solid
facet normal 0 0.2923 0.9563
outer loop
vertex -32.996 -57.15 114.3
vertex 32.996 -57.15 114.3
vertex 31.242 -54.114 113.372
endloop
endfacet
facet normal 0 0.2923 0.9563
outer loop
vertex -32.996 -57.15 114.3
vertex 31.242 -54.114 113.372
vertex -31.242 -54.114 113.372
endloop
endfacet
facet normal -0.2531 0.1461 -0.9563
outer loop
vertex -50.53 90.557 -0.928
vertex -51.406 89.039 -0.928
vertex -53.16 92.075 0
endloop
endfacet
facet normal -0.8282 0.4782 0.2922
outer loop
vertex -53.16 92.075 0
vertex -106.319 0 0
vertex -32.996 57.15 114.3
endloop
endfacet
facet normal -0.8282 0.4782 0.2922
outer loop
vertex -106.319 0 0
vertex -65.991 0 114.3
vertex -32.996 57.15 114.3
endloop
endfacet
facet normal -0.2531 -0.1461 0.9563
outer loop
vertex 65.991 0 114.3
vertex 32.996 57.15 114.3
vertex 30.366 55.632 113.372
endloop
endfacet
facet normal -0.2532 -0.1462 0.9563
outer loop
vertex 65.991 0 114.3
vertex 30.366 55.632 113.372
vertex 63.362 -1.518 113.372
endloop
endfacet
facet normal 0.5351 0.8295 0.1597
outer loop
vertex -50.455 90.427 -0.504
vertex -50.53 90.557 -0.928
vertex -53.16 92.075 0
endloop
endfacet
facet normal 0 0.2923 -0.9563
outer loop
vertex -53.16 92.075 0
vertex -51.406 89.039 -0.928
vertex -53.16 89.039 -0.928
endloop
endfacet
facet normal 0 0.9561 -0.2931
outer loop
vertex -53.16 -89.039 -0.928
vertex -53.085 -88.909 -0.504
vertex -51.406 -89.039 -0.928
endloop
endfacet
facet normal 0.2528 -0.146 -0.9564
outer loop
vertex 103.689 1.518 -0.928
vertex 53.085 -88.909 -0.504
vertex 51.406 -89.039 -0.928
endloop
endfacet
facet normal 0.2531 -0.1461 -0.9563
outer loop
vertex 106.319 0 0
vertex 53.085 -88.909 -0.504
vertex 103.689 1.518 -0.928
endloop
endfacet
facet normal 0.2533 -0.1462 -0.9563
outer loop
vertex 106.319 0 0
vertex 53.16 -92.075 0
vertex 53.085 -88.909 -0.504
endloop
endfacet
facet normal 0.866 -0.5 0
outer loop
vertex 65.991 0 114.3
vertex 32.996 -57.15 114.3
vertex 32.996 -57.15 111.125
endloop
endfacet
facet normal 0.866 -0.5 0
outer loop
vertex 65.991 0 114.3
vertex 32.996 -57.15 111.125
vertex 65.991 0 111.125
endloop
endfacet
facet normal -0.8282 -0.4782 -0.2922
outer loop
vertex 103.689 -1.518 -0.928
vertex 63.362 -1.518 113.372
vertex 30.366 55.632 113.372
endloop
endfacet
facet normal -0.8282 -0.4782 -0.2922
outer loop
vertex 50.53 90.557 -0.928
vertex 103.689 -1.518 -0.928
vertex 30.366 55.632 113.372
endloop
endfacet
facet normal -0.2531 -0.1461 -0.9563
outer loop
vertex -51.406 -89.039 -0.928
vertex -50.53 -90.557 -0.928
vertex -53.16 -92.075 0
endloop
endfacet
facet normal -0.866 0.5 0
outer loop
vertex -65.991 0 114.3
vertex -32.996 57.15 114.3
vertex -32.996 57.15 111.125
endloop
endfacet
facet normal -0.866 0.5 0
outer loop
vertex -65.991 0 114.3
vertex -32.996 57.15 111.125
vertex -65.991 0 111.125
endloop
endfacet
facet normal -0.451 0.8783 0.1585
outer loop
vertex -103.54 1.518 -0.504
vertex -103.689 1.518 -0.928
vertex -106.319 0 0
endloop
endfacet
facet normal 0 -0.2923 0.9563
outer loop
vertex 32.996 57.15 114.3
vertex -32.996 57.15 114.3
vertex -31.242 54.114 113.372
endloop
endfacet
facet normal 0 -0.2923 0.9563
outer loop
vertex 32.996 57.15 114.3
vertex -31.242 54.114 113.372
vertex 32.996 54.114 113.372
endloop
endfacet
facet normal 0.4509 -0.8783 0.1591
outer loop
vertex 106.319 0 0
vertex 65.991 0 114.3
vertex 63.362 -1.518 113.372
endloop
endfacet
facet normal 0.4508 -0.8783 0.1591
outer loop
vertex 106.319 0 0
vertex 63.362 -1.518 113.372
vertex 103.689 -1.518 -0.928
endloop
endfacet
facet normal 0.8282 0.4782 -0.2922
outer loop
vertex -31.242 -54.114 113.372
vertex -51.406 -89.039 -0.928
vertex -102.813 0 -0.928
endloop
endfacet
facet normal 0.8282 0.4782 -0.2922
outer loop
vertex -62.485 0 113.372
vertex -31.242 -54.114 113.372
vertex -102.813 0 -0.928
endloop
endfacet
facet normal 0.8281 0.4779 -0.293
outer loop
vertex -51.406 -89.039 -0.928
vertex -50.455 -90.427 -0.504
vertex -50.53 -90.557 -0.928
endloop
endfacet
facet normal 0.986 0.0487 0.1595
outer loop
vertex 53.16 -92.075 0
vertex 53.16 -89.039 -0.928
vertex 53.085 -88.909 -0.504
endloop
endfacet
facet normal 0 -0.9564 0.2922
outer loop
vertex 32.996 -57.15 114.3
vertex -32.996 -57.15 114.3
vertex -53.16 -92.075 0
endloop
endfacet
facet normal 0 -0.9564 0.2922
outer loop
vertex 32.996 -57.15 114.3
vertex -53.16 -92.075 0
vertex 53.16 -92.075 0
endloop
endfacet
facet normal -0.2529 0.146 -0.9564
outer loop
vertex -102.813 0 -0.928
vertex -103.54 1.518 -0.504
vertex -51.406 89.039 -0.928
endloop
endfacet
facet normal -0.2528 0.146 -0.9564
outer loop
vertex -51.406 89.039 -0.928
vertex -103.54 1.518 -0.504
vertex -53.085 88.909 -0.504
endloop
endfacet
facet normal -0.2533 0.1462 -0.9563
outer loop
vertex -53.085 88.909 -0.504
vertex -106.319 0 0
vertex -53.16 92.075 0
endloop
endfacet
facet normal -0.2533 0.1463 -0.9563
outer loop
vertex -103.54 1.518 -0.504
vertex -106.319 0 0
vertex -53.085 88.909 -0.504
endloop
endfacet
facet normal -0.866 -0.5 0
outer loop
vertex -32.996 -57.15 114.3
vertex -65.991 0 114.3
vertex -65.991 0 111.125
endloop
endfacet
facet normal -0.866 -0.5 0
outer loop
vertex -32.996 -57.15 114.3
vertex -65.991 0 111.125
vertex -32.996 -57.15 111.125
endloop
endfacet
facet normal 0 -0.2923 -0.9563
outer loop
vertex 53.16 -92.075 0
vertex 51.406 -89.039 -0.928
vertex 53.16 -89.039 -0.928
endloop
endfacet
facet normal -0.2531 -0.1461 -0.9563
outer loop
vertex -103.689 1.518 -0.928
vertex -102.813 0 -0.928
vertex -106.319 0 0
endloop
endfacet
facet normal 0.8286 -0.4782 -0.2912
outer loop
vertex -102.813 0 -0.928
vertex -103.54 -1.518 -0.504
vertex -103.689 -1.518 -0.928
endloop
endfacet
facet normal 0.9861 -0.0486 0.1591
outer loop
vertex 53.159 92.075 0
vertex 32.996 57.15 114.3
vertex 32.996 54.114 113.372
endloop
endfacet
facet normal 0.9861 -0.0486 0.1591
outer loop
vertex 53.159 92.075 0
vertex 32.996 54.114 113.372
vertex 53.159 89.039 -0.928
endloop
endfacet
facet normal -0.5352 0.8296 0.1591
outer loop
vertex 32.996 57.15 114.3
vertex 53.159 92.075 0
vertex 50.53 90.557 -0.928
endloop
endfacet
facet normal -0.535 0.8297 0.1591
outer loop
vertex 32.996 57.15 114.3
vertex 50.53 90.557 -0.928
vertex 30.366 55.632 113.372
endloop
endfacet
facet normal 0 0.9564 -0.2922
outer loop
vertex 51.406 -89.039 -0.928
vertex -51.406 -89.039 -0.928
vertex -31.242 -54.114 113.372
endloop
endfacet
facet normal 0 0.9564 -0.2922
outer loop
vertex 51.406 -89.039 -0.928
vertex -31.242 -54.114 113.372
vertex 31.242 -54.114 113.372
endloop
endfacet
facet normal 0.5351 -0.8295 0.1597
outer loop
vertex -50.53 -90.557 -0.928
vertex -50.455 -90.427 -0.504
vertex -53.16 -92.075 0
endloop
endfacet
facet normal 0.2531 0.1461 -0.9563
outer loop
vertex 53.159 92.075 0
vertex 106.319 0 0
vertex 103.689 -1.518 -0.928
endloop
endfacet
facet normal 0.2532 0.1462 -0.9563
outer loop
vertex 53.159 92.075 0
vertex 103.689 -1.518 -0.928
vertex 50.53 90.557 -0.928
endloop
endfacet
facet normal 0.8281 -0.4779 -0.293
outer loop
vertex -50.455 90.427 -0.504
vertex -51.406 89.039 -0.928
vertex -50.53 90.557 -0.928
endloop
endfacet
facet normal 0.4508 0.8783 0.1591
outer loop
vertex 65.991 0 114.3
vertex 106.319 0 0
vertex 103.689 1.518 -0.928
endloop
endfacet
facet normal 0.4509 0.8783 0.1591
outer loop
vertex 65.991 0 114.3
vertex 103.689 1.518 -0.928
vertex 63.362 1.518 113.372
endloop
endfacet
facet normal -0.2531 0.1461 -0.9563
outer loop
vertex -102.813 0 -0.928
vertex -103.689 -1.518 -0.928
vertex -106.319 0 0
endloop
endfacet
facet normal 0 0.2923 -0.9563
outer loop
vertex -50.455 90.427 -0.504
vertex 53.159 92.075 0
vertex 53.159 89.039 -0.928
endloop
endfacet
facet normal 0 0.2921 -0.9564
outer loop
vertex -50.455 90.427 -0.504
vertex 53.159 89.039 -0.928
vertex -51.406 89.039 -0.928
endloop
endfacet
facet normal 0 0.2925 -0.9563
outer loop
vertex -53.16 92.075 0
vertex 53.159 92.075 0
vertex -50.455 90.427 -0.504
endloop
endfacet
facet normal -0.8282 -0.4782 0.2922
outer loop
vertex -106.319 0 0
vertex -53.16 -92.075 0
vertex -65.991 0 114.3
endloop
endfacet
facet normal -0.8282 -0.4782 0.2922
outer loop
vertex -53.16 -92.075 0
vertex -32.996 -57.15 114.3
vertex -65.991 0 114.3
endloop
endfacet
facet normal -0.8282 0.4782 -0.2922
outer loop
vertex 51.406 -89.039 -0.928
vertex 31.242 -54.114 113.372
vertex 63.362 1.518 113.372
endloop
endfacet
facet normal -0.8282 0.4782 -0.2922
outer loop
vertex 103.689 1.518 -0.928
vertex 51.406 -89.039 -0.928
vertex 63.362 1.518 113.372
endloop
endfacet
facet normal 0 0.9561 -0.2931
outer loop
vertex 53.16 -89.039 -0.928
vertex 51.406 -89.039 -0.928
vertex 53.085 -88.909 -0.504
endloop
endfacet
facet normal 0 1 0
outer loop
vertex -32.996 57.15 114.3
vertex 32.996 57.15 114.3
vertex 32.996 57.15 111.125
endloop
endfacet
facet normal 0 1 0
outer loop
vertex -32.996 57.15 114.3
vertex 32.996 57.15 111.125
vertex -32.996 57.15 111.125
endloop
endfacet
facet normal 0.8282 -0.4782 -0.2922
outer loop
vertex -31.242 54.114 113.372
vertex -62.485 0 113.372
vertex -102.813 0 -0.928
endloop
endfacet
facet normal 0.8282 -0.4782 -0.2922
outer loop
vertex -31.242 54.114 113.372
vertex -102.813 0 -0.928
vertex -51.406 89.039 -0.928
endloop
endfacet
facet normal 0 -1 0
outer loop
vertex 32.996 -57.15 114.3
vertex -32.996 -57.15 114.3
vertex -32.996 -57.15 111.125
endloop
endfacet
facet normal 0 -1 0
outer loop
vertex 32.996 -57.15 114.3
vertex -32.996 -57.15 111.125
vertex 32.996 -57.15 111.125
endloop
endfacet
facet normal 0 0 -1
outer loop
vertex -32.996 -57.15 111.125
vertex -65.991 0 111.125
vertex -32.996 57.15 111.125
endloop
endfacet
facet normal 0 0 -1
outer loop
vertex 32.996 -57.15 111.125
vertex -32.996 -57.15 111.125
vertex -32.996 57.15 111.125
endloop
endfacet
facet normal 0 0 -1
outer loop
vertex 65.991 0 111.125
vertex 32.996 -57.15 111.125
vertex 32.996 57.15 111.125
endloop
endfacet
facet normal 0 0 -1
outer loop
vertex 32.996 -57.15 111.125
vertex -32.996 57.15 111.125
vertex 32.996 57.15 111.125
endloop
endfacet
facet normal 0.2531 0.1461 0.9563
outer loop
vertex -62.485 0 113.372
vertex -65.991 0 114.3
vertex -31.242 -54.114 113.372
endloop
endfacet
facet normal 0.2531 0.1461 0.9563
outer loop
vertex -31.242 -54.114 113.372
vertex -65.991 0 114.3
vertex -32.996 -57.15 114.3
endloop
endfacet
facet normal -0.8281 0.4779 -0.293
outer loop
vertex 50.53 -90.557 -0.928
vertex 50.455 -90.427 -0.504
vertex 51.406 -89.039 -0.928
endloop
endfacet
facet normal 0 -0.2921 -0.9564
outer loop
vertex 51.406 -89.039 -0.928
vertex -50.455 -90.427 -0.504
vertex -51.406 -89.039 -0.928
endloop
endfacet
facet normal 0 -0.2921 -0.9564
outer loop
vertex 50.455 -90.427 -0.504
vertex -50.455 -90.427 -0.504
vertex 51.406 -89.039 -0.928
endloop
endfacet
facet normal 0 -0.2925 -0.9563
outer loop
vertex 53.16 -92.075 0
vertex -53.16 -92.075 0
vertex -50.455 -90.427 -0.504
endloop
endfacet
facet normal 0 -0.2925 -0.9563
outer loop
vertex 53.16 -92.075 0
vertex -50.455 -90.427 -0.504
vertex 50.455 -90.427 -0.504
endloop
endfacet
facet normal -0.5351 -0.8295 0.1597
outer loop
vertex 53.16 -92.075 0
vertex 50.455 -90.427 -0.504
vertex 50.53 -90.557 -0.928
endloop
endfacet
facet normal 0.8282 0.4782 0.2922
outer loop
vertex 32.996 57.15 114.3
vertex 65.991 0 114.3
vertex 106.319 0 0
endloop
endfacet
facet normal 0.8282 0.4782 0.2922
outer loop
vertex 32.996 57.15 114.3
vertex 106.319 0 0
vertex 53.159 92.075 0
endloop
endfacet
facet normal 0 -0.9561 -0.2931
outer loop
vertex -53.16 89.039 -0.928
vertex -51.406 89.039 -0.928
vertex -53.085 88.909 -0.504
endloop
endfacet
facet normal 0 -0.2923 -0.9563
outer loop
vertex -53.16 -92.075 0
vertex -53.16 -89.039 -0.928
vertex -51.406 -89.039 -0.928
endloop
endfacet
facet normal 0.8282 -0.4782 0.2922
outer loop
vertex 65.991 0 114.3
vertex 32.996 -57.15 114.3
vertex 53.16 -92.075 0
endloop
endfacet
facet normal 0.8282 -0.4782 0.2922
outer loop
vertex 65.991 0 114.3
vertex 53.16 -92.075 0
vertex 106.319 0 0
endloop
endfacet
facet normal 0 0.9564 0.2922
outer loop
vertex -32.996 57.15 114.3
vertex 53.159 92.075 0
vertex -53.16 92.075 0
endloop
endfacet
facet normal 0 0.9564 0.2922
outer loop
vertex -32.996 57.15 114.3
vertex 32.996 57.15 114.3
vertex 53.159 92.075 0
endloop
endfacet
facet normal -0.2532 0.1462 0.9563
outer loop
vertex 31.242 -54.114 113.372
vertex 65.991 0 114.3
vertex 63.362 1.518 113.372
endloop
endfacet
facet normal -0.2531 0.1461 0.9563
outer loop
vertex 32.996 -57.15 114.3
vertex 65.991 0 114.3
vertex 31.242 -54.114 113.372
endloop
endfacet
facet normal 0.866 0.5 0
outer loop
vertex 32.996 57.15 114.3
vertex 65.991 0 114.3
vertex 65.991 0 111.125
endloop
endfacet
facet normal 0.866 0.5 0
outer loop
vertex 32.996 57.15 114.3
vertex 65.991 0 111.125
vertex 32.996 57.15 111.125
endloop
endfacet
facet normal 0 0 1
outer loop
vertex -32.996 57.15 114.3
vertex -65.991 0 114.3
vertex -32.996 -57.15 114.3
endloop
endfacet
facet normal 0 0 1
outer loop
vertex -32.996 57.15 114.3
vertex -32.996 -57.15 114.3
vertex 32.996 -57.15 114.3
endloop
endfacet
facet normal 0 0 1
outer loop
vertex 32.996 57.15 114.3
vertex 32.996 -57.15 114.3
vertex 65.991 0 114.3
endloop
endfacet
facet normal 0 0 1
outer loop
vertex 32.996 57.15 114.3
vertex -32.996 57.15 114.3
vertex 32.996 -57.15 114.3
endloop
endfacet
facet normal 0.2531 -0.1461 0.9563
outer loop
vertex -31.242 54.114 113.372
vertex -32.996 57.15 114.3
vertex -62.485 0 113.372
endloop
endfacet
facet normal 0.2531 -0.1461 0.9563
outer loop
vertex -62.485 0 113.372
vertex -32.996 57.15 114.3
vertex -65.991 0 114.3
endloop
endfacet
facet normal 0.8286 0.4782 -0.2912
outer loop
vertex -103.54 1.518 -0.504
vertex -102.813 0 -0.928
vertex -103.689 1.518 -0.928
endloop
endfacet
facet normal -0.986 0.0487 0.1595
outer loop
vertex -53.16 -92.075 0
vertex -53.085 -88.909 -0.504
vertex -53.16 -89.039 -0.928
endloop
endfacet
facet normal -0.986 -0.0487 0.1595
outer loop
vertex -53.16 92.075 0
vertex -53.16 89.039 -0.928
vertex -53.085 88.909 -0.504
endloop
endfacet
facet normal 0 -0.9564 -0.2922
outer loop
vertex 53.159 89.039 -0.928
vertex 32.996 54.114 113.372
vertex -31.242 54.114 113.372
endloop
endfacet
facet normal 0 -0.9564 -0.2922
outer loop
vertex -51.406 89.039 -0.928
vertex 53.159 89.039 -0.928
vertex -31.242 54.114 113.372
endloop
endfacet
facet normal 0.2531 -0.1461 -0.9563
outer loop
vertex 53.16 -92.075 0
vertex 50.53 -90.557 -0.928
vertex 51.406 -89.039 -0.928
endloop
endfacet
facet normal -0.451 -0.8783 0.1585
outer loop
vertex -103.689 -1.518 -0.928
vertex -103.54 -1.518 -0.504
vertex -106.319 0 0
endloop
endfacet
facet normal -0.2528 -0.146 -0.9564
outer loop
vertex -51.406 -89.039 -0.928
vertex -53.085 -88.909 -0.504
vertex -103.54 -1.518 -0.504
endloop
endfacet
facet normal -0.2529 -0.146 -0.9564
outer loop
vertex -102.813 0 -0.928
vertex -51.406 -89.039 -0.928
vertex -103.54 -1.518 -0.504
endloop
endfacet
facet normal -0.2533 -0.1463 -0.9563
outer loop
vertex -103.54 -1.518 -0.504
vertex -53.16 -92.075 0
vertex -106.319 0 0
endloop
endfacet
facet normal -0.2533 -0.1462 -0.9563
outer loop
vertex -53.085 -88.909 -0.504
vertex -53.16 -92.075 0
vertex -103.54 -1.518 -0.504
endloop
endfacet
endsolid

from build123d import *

# Parameters (mm, degrees)
F15_DEPTH = 3.175
F16_DEPTH = 3.175
F17_DEPTH = 3.175
F18_DEPTH = 3.175
F19_DEPTH = 3.175
F20_DEPTH = 3.175
F21_DEPTH = 3.175
F22_W     = 51
F22_H     = 51
F23_DEPTH = 3


with BuildPart() as f15:
    # F14 (on 3pt) → F15 (new body)
    with BuildSketch(Plane(origin=(72.9302177934, -42.1062808751, 25.7316160903), x_dir=(0.4509315595, 0.8782641505, 0.1591000017), z_dir=(0.8282247555, -0.4781757855, 0.2922185356))):
        Polygon((-17.1289231327, 96.8093402992), (-56.8948636851, -17.6873880615), (47.9426159531, -35.3747761231), (47.9426159531, 85.8309615024), align=None)
    extrude(amount=-F15_DEPTH)

    # F4 (on 3pt) → F16 (join)
    with BuildSketch(Plane(origin=(0, -84.2125617502, 25.7316160903), x_dir=(1, 0, 0), z_dir=(0, -0.9563515711, 0.2922185356))):
        Polygon((-32.9955678842, 92.6106952617), (-53.1595260356, -26.9060216653), (53.1595260356, -26.9060216653), (32.9955678842, 92.6106952617), align=None)
    extrude(amount=-F16_DEPTH)

    # F6 (on 3pt) → F17 (join)
    with BuildSketch(Plane(origin=(-72.9302177934, -42.1062808751, 25.7316160903), x_dir=(-0.4509315595, 0.8782641505, 0.1591000017), z_dir=(0.8282247555, 0.4781757855, -0.2922185356))):
        Polygon((-56.8948636851, -17.6873880615), (47.9426159531, -35.3747761231), (47.9426159531, 85.8309615024), (-17.1289231327, 96.8093402992), align=None)
    extrude(amount=F17_DEPTH)

    # F8 (on 3pt) → F18 (join)
    with BuildSketch(Plane(origin=(-72.9302177934, 42.1062808751, 25.7316160903), x_dir=(0.4509315595, 0.8782641505, -0.1591000017), z_dir=(0.8282247555, -0.4781757855, -0.2922185356))):
        Polygon((-47.9426159531, -35.3747761231), (56.8948636851, -17.6873880615), (17.1289231327, 96.8093402992), (-47.9426159531, 85.8309615024), align=None)
    extrude(amount=F18_DEPTH)

    # F10 (on 3pt) → F19 (join)
    with BuildSketch(Plane(origin=(0, 84.2125617502, 25.7316160903), x_dir=(-1, 0, 0), z_dir=(0, 0.9563515711, 0.2922185356))):
        Polygon((-53.1594544198, -26.9060216653), (53.1595260356, -26.9060216653), (32.9955678842, 92.6106952617), (-32.9955678842, 92.6106952617), align=None)
    extrude(amount=-F19_DEPTH)

    # F22 (on face) → F23 (join)
    with BuildSketch(Plane(origin=(0, 84.2125617502, 25.7316160903), x_dir=(-1, 0, 0), z_dir=(0, 0.9563515711, 0.2922185356))):
        with Locations((0, 37.2206158936)):
            Rectangle(F22_W, F22_H)
    extrude(amount=-F23_DEPTH)


with BuildPart() as f20:
    # F12 (on 3pt) → F20 (new body)
    with BuildSketch(Plane(origin=(72.930172863, 42.1063116595, 25.7316002377), x_dir=(-0.4509320281, 0.87826388, -0.159100167), z_dir=(0.8282245004, 0.4781762824, 0.2922184456))):
        Polygon((-47.9426657727, 85.8309615024), (-47.9426657727, -35.3747761231), (56.895113183, -17.6876249146), (17.1287326196, 96.8093622096), align=None)
    extrude(amount=-F20_DEPTH)


with BuildPart() as f21:
    # F2 (on offset) → F21 (new body)
    with BuildSketch(Plane.XY.offset(114.3)):
        Polygon((32.9955678842, 57.15), (-32.9955678842, 57.15), (-65.9911357684, 0), (-32.9955678842, -57.15), (32.9955678842, -57.15), (65.9911357684, 0), align=None)
    extrude(amount=-F21_DEPTH)


solid = Compound([f15.part, f20.part, f21.part])
